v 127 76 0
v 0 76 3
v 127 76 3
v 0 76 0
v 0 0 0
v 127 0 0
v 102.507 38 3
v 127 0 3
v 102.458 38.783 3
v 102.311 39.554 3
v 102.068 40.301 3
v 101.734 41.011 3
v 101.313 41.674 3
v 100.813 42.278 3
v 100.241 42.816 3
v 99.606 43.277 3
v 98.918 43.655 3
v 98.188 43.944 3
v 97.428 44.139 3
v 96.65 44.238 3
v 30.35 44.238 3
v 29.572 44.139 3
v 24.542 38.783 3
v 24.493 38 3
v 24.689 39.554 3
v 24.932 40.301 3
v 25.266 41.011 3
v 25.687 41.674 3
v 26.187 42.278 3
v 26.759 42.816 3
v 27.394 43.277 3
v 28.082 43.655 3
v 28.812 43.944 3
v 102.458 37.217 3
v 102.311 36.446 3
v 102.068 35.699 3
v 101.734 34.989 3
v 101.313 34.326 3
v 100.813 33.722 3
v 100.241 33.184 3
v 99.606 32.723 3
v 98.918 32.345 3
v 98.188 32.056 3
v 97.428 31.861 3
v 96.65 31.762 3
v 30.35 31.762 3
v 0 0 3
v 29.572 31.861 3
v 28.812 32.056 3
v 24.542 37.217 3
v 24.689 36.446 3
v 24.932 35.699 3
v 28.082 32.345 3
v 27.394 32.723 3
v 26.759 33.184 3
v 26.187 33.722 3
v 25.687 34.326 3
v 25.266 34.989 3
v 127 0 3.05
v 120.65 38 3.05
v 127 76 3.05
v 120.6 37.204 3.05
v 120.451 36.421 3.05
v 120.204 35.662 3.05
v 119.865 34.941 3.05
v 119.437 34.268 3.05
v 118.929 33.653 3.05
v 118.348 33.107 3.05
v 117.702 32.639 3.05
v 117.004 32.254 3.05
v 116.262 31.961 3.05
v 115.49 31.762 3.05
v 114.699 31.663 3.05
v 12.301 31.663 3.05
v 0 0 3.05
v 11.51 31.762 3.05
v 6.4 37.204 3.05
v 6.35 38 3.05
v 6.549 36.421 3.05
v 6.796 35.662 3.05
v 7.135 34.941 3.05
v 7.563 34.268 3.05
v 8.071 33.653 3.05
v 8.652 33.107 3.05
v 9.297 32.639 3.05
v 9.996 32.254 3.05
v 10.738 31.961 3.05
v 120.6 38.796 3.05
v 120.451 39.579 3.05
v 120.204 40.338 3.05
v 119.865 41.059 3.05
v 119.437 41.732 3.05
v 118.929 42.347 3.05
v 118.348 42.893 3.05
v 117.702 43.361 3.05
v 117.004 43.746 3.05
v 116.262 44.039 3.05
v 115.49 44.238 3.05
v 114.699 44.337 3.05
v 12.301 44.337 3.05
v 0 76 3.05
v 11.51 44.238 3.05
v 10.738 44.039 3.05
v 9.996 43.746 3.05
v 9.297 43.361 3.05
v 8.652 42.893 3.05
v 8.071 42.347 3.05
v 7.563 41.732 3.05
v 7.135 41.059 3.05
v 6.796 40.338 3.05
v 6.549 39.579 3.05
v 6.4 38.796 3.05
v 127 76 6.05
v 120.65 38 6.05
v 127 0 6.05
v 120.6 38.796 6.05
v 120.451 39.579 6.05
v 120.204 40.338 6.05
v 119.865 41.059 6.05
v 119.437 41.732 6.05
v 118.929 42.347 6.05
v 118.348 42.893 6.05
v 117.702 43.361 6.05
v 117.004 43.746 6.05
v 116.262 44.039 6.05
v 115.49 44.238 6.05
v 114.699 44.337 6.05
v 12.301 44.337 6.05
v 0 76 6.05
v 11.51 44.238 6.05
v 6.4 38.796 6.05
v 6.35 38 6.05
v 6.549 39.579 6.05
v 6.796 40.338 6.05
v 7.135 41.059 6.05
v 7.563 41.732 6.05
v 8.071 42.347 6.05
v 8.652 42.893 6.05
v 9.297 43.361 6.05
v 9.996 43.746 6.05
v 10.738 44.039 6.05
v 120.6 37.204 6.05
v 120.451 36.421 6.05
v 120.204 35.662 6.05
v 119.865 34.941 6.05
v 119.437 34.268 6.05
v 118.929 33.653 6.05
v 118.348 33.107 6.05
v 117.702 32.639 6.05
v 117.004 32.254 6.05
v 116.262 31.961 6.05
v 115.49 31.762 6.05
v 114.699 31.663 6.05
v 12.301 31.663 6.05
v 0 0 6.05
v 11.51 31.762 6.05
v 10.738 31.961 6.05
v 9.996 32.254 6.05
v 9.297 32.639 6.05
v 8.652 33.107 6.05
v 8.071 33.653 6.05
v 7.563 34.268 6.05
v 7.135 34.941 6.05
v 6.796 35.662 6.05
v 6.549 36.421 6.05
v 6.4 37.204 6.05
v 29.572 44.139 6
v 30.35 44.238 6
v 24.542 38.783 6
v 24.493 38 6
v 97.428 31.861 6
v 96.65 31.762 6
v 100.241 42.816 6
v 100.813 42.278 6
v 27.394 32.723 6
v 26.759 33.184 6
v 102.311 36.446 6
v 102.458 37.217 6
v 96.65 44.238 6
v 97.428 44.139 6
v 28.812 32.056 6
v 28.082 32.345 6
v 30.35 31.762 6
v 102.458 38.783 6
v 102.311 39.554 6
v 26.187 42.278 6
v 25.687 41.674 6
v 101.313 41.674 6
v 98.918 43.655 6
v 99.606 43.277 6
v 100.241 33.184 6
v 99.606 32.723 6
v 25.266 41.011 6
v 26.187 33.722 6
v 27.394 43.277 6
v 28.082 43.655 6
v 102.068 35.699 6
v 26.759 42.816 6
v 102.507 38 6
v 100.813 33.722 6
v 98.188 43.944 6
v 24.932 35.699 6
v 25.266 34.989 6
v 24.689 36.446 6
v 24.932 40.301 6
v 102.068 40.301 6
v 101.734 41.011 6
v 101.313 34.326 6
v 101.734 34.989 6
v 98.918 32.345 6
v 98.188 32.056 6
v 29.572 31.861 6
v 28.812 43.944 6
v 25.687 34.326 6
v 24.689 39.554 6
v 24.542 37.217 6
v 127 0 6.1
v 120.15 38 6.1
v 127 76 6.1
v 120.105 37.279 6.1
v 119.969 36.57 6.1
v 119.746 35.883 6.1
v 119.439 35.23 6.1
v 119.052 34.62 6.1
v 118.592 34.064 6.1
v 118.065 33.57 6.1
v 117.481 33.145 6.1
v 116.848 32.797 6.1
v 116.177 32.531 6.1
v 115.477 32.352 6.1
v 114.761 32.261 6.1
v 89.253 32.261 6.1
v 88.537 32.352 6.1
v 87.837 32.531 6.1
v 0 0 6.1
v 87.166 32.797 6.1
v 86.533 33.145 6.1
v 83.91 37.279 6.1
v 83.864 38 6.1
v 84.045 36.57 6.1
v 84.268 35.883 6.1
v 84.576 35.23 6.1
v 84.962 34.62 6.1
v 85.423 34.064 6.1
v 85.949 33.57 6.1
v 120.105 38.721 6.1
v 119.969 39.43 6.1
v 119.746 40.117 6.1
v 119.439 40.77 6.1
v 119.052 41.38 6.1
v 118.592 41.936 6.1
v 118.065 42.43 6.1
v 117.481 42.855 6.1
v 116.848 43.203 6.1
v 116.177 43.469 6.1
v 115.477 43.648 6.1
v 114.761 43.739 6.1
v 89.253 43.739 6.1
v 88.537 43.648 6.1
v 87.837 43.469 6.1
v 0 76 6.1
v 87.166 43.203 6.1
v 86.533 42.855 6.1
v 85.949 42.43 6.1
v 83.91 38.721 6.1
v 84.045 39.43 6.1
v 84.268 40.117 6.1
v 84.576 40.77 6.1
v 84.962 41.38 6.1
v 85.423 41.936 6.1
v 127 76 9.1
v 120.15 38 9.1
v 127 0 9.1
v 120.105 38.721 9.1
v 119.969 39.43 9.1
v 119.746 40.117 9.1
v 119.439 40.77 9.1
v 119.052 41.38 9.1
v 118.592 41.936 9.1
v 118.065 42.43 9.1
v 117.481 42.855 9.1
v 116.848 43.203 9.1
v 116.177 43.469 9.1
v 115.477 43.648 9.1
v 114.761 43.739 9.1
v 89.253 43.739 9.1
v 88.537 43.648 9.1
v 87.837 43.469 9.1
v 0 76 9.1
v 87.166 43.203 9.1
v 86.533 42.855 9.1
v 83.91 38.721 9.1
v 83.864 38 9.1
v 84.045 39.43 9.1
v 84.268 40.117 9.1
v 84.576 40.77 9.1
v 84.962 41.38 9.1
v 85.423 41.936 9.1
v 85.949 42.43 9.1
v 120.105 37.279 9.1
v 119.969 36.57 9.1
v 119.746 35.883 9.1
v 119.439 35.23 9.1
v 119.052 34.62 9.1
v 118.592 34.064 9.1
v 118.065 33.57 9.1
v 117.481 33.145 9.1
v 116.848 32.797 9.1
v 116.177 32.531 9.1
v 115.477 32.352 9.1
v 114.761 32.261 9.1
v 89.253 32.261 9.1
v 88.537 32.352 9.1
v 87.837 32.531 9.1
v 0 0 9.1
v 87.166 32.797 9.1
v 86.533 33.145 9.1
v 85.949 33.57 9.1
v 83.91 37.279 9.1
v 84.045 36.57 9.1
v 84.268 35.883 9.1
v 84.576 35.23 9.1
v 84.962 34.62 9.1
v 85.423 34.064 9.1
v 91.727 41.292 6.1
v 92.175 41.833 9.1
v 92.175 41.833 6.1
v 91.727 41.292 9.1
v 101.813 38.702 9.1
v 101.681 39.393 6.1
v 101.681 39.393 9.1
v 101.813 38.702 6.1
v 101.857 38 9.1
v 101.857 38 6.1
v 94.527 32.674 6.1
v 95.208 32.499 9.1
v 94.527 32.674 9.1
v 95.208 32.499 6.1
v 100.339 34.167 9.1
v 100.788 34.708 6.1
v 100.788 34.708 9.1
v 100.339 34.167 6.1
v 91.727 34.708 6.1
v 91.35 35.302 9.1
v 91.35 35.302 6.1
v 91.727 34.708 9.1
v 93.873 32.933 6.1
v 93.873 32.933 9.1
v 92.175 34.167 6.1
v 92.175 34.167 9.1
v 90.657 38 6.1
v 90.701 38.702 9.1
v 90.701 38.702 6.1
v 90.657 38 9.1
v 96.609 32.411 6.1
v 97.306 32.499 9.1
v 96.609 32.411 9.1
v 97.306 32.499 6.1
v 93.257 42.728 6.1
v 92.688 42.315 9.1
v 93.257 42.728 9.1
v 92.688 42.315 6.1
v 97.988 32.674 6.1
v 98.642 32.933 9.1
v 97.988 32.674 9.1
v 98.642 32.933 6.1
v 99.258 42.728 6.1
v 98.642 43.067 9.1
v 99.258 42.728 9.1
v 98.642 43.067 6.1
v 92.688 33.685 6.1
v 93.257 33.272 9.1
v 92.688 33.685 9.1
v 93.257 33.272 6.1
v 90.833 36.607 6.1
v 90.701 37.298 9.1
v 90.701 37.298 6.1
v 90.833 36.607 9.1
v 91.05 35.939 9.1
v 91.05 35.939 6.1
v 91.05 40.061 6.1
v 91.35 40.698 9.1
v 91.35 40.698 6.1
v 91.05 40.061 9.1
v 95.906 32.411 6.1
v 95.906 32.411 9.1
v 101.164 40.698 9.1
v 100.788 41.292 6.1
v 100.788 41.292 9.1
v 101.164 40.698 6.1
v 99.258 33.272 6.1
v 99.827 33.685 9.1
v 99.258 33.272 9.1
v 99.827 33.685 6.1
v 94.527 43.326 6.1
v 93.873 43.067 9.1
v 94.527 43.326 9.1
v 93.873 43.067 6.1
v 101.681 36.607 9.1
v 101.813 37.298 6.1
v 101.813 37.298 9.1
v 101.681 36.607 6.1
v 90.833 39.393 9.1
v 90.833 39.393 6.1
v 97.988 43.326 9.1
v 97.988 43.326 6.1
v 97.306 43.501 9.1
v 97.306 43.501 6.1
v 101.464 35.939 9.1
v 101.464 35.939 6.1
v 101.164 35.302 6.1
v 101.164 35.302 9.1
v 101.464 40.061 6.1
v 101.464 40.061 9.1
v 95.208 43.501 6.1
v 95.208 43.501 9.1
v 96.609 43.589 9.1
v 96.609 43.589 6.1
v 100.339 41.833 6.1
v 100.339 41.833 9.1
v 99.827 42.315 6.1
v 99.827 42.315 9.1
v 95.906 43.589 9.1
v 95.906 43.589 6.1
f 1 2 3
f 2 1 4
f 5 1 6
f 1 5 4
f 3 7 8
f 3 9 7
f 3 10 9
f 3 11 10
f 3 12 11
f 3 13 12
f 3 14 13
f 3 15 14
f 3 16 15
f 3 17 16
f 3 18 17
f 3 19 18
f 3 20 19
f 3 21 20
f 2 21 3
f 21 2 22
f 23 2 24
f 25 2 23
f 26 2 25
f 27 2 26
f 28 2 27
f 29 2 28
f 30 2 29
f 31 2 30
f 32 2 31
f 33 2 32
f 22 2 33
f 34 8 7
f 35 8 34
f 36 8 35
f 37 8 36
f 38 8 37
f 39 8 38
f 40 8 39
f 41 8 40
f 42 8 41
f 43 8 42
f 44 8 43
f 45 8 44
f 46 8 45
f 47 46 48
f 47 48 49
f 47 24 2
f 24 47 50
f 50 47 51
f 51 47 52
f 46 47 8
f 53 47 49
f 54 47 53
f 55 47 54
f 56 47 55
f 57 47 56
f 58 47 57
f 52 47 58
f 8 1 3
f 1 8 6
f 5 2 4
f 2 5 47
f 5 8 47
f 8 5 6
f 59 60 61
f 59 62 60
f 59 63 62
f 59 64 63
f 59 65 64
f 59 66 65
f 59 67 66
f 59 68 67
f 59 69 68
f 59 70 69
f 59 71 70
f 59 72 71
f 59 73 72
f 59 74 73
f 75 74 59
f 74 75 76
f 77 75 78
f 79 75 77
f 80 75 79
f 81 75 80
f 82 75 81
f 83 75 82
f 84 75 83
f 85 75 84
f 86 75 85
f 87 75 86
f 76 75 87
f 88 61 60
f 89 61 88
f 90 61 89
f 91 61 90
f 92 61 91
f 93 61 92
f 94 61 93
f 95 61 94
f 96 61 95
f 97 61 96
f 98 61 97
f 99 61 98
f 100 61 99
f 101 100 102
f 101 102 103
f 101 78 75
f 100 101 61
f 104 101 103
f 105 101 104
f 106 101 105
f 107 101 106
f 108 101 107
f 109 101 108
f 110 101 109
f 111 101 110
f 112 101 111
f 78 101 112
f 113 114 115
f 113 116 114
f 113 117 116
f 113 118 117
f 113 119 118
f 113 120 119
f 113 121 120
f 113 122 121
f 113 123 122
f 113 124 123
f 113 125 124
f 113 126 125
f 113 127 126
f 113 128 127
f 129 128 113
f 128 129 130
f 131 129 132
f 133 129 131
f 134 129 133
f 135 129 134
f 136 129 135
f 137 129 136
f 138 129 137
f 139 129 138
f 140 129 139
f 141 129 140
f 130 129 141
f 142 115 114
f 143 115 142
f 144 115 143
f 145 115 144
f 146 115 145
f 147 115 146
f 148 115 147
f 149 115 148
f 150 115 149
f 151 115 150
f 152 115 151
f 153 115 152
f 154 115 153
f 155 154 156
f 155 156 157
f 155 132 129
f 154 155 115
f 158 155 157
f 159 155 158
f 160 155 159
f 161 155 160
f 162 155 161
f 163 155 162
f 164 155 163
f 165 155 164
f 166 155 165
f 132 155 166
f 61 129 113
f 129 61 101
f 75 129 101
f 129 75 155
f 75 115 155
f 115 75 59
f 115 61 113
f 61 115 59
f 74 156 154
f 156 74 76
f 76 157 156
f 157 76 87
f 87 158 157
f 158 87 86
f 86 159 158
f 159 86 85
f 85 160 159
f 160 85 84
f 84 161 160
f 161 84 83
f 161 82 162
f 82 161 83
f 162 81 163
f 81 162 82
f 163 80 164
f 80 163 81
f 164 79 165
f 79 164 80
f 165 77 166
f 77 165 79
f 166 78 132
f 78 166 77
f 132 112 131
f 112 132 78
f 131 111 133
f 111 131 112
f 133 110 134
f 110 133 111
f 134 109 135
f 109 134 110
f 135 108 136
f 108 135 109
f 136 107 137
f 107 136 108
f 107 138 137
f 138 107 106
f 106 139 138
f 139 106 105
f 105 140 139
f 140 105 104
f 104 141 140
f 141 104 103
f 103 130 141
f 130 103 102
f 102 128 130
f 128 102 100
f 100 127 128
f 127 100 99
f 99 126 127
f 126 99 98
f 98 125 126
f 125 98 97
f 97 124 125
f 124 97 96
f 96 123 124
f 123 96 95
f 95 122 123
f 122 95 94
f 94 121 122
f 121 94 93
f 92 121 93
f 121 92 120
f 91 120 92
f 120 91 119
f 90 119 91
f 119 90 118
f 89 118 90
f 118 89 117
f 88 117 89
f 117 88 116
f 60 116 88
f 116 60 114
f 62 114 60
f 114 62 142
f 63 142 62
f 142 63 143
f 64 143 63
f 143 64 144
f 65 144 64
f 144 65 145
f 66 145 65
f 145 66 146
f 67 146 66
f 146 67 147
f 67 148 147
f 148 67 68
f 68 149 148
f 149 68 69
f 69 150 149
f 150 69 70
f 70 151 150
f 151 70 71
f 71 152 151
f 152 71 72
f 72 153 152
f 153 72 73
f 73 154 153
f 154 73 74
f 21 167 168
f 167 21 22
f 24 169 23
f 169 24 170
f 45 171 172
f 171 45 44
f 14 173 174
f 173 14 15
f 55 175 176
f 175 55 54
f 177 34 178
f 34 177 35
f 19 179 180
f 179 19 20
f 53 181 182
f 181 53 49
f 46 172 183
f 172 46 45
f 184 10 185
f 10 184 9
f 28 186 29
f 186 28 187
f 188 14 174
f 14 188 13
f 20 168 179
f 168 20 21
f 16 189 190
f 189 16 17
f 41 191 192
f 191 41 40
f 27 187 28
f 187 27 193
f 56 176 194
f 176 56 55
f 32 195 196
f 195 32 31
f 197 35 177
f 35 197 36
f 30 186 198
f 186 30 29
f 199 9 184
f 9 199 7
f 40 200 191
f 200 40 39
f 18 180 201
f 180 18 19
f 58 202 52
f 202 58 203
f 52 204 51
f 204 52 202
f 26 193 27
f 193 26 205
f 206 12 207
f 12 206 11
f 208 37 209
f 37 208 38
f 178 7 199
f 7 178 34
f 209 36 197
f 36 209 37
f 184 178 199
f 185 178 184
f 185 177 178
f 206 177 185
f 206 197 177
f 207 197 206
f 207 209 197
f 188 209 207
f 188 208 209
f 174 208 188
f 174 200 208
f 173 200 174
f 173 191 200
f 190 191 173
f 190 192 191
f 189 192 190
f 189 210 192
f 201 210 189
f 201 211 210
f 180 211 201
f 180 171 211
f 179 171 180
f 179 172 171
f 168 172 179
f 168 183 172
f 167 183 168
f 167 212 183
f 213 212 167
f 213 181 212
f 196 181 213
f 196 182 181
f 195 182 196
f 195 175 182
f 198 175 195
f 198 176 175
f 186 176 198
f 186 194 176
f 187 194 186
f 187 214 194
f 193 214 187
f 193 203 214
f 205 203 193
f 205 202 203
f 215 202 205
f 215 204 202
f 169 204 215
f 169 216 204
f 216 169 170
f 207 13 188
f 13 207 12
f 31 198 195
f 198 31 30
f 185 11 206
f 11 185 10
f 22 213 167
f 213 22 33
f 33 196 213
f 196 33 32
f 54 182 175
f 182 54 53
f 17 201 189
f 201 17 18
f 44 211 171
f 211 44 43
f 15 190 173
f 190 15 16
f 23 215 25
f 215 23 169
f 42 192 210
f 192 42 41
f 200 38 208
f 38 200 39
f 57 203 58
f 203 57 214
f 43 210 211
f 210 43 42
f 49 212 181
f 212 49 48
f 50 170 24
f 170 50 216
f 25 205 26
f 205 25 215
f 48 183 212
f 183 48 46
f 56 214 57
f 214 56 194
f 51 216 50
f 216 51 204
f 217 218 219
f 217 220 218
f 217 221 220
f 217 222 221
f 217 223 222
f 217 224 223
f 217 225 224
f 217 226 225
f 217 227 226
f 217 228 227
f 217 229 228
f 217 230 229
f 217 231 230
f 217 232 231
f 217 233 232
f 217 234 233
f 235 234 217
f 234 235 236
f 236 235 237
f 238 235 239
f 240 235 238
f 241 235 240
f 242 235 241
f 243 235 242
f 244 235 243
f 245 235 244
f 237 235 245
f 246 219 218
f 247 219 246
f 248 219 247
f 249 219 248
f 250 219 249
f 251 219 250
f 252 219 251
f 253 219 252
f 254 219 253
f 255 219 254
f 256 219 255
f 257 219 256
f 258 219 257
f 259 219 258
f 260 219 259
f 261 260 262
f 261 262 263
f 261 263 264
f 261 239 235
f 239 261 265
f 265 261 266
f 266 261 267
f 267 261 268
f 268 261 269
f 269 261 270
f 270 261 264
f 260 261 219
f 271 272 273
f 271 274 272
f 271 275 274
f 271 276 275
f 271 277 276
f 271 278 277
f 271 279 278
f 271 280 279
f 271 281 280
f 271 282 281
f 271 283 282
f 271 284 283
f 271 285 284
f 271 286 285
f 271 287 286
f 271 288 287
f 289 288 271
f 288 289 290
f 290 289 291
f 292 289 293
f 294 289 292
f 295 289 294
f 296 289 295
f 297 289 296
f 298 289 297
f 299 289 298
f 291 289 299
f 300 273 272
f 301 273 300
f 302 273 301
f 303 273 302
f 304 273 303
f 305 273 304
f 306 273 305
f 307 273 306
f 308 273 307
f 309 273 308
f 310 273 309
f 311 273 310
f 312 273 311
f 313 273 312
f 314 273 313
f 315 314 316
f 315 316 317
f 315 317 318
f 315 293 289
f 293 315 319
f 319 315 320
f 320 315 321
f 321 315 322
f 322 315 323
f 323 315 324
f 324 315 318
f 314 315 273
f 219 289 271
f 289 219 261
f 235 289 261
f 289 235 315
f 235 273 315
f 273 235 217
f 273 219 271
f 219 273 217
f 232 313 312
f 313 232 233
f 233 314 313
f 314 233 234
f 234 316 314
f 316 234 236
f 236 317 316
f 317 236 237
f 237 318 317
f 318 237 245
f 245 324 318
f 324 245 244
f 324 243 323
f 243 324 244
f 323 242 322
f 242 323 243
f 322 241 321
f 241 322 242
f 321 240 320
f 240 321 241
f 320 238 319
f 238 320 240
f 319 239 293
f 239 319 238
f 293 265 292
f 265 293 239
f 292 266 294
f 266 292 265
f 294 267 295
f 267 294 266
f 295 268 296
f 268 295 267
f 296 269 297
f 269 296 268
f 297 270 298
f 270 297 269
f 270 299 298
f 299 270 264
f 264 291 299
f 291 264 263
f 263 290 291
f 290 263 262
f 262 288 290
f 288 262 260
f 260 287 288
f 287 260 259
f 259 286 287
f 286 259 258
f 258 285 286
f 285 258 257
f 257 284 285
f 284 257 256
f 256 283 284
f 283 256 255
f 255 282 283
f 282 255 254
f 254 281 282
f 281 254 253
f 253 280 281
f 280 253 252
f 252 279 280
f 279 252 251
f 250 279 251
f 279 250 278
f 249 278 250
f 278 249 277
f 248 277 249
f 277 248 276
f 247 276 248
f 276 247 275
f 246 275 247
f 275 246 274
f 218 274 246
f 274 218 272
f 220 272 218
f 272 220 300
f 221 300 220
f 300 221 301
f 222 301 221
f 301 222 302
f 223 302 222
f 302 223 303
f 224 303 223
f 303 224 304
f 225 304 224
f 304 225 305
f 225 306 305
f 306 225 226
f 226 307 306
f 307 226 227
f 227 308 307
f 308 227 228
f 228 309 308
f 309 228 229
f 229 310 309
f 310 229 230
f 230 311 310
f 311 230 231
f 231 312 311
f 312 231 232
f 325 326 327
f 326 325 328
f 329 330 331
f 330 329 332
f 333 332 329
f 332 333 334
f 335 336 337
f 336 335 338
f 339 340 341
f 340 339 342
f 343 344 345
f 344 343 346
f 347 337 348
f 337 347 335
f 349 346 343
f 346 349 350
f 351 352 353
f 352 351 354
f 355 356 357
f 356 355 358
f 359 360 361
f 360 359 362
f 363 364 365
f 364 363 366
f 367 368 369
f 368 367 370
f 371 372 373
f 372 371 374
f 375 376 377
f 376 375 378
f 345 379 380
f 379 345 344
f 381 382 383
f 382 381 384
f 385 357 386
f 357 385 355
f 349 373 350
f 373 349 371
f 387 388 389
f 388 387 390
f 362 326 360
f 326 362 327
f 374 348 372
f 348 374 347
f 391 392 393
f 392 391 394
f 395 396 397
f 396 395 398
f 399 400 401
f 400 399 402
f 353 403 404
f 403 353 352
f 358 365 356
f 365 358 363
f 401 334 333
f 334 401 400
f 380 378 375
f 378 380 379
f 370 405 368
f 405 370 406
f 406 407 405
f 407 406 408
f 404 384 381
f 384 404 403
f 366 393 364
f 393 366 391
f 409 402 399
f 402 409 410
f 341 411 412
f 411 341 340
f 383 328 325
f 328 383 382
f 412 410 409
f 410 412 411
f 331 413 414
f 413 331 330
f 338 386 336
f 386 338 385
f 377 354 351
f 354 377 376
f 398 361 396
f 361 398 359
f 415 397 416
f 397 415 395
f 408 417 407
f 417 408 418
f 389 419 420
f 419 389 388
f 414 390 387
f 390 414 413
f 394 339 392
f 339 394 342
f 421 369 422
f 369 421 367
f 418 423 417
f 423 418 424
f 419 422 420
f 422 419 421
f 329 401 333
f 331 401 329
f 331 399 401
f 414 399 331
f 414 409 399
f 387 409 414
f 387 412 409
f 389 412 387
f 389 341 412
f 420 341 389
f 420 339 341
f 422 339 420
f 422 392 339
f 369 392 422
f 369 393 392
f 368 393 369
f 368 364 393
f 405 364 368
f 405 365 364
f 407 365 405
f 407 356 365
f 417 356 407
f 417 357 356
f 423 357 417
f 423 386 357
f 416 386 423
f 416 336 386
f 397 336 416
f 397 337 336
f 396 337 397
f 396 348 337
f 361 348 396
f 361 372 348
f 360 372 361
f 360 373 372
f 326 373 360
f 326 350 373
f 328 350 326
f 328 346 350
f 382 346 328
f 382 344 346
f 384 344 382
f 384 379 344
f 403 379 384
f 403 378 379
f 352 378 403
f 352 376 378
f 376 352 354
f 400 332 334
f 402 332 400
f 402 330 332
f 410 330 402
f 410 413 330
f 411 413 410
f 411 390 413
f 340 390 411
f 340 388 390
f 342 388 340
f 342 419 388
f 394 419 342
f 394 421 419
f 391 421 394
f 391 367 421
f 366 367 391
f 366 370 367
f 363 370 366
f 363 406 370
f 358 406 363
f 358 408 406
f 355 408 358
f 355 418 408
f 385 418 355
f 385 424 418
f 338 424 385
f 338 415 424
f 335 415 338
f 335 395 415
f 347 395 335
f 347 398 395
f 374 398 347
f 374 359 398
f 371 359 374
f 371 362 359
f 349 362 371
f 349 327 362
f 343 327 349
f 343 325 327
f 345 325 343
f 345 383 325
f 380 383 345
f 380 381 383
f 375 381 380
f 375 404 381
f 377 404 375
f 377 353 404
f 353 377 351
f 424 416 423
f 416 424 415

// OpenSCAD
// ========================================
// REMINDER BOARD - OPENSCAD MODEL
// ========================================
//
// Laser Reminder Slider Generator
// Parametric design for laser-cut reminder boards with sliding indicators
//
// Copyright (c) 2025 Alex
//
// This project is licensed under the MIT License.
//
// Permission is hereby granted, free of charge, to any person obtaining a copy
// of this software and associated documentation files (the "Software"), to deal
// in the Software without restriction, including without limitation the rights
// to use, copy, modify, merge, publish, distribute, sublicense, and/or sell
// copies of the Software, and to permit persons to whom the Software is
// furnished to do so, subject to the following conditions:
//
// The above copyright notice and this permission notice shall be included in all
// copies or substantial portions of the Software.
//
// THE SOFTWARE IS PROVIDED "AS IS", WITHOUT WARRANTY OF ANY KIND, EXPRESS OR
// IMPLIED, INCLUDING BUT NOT LIMITED TO THE WARRANTIES OF MERCHANTABILITY,
// FITNESS FOR A PARTICULAR PURPOSE AND NONINFRINGEMENT. IN NO EVENT SHALL THE
// AUTHORS OR COPYRIGHT HOLDERS BE LIABLE FOR ANY CLAIM, DAMAGES OR OTHER
// LIABILITY, WHETHER IN AN ACTION OF CONTRACT, TORT OR OTHERWISE, ARISING FROM,
// OUT OF OR IN CONNECTION WITH THE SOFTWARE OR THE USE OR OTHER DEALINGS IN THE
// SOFTWARE.
//
// Repository: https://github.com/[your-username]/laser-reminder-slider-generator
//
// ========================================

// KEY VARIABLES
// ========================================
material_thickness = 3;  // mm
board_width = 127;       // mm
num_slider_sections = 1; // Number of slider tracks
layer_gap = 0.05;        // mm gap between layers

// EXPORT MODE - Choose which part to export for laser cutting
// Options: "assembly", "layer1", "layer2", "layer3", "slider", "knob"
export_mode = "assembly";

// Section heights
header_height = 30;      // mm
slider_height = 16;      // mm per slider
footer_height = 30;      // mm

// Slider slot dimensions
slot_margin = 6.35;      // mm from left/right edges
slot_height = 12.70;     // mm height of the slot
slot_radius = slot_height / 2;  // radius for rounded ends
slot_width = board_width - (2 * slot_margin);  // calculated slot width

// Slider dimensions
slider_clearance = 0.2;  // mm clearance from slot sides
slider_piece_height = slot_height - slider_clearance;
slider_radius = slider_piece_height / 2;
slider_length = slot_width - (board_width / 3.5);

// Knob cutout dimensions (for top layer)
knob_cutout_width = board_width / 3.5;  // mm width of knob cutout
knob_cutout_margin = 0.5;  // mm from slot edge
knob_height_reduction = 0.5;  // mm reduction top and bottom
knob_cutout_height = slider_piece_height - (2 * knob_height_reduction);
knob_cutout_radius = knob_cutout_height / 2;

// Knob dimensions
knob_clearance = 0.3;  // mm clearance from cutout
knob_diameter = knob_cutout_height - knob_clearance;
knob_radius = knob_diameter / 2;

// Calculated total height
total_height = header_height + (slider_height * num_slider_sections) + footer_height;

// ========================================
// LAYER 1 - BOTTOM LAYER (2D)
// ========================================

module layer1_2d() {
    // Header rectangle
    translate([0, footer_height + (slider_height * num_slider_sections)])
        square([board_width, header_height]);
    
    // Slider section(s)
    translate([0, footer_height])
        square([board_width, slider_height * num_slider_sections]);
    
    // Footer rectangle
    square([board_width, footer_height]);
}

module layer1() {
    linear_extrude(height = material_thickness)
        layer1_2d();
}

// ========================================
// LAYER 2 - SLIDER TRACK LAYER (2D)
// ========================================

module pill_slot_2d() {
    // Create pill shape using hull of two circles
    slot_length = board_width - (2 * slot_margin);
    hull() {
        // Left end
        translate([slot_margin + slot_radius, 0])
            circle(r = slot_radius, $fn = 50);
        // Right end
        translate([board_width - slot_margin - slot_radius, 0])
            circle(r = slot_radius, $fn = 50);
    }
}

module layer2_2d() {
    difference() {
        union() {
            // Header rectangle
            translate([0, footer_height + (slider_height * num_slider_sections)])
                square([board_width, header_height]);
            
            // Slider section(s)
            translate([0, footer_height])
                square([board_width, slider_height * num_slider_sections]);
            
            // Footer rectangle
            square([board_width, footer_height]);
        }
        
        // Cut out pill-shaped slots for each slider
        for (i = [0 : num_slider_sections - 1]) {
            // Center the slot vertically in each slider section
            slot_y_offset = footer_height + (i * slider_height) + (slider_height - slot_height) / 2 + slot_radius;
            translate([0, slot_y_offset])
                pill_slot_2d();
        }
    }
}

module layer2() {
    linear_extrude(height = material_thickness)
        layer2_2d();
}

// ========================================
// LAYER 3 - TOP LAYER WITH KNOB CUTOUTS (2D)
// ========================================

module knob_cutout_2d() {
    // Create pill shape for knob cutout
    hull() {
        // Left end
        translate([knob_cutout_radius, 0])
            circle(r = knob_cutout_radius, $fn = 50);
        // Right end
        translate([knob_cutout_width - knob_cutout_radius, 0])
            circle(r = knob_cutout_radius, $fn = 50);
    }
}

module layer3_2d() {
    difference() {
        union() {
            // Header rectangle
            translate([0, footer_height + (slider_height * num_slider_sections)])
                square([board_width, header_height]);
            
            // Slider section(s)
            translate([0, footer_height])
                square([board_width, slider_height * num_slider_sections]);
            
            // Footer rectangle
            square([board_width, footer_height]);
        }
        
        // Cut out knob slots for each slider
        for (i = [0 : num_slider_sections - 1]) {
            // Position knob cutout - right side of slot, 0.5mm from edge
            knob_x_offset = board_width - slot_margin - knob_cutout_margin - knob_cutout_width;
            // Center the cutout vertically in each slider section
            knob_y_offset = footer_height + (i * slider_height) + (slider_height - knob_cutout_height) / 2 + knob_cutout_radius;
            
            translate([knob_x_offset, knob_y_offset])
                knob_cutout_2d();
        }
    }
}

module layer3() {
    linear_extrude(height = material_thickness)
        layer3_2d();
}

// ========================================
// SLIDER - Movable piece in the slot (2D)
// ========================================

module slider_2d() {
    // Create pill shape for slider
    hull() {
        // Left end
        translate([slider_radius, 0])
            circle(r = slider_radius, $fn = 50);
        // Right end
        translate([slider_length - slider_radius, 0])
            circle(r = slider_radius, $fn = 50);
    }
}

module slider() {
    linear_extrude(height = material_thickness)
        slider_2d();
}

// ========================================
// KNOB - Glued to slider, goes through top cutout (2D)
// ========================================

module knob_2d() {
    circle(r = knob_radius, $fn = 50);
}

module knob() {
    linear_extrude(height = material_thickness)
        knob_2d();
}

// ========================================
// RENDER ASSEMBLY OR EXPORT MODE
// ========================================

if (export_mode == "assembly") {
    // Full 3D assembly view
    
    // Layer 1 - Bottom
    layer1();
    
    // Layer 2 - On top with gap
    translate([0, 0, material_thickness + layer_gap])
        layer2();
    
    // Sliders - positioned in the slots
    for (i = [0 : num_slider_sections - 1]) {
        // Center slider horizontally in the slot
        slider_x_offset = slot_margin + (slot_width - slider_length) / 2;
        // Center slider vertically in the slider section
        slider_y_offset = footer_height + (i * slider_height) + (slider_height - slider_piece_height) / 2 + slider_radius;
        
        translate([slider_x_offset, slider_y_offset, material_thickness])
            slider();
    }
    
    // Layer 3 - Top layer with gap
    translate([0, 0, (2 * material_thickness) + (2 * layer_gap)])
        layer3();
    
    // Knobs - flush with layer 3, at right end of sliders
    for (i = [0 : num_slider_sections - 1]) {
        // Position at right end of slider
        slider_x_offset = slot_margin + (slot_width - slider_length) / 2;
        knob_x_offset = slider_x_offset + slider_length - slider_radius;
        // Center vertically in the slider section
        knob_y_offset = footer_height + (i * slider_height) + (slider_height / 2);
        
        translate([knob_x_offset, knob_y_offset, (2 * material_thickness) + (2 * layer_gap)])
            knob();
    }
    
} else if (export_mode == "layer1") {
    // Export Layer 1 as 2D
    layer1_2d();
        
} else if (export_mode == "layer2") {
    // Export Layer 2 as 2D
    layer2_2d();
        
} else if (export_mode == "layer3") {
    // Export Layer 3 as 2D
    layer3_2d();
        
} else if (export_mode == "slider") {
    // Export all sliders as 2D, spaced out
    for (i = [0 : num_slider_sections - 1]) {
        translate([0, i * (slider_piece_height + 5)])
            slider_2d();
    }
    
} else if (export_mode == "knob") {
    // Export all knobs as 2D, spaced out
    for (i = [0 : num_slider_sections - 1]) {
        translate([i * (knob_diameter + 5), 0])
            knob_2d();
    }
}
